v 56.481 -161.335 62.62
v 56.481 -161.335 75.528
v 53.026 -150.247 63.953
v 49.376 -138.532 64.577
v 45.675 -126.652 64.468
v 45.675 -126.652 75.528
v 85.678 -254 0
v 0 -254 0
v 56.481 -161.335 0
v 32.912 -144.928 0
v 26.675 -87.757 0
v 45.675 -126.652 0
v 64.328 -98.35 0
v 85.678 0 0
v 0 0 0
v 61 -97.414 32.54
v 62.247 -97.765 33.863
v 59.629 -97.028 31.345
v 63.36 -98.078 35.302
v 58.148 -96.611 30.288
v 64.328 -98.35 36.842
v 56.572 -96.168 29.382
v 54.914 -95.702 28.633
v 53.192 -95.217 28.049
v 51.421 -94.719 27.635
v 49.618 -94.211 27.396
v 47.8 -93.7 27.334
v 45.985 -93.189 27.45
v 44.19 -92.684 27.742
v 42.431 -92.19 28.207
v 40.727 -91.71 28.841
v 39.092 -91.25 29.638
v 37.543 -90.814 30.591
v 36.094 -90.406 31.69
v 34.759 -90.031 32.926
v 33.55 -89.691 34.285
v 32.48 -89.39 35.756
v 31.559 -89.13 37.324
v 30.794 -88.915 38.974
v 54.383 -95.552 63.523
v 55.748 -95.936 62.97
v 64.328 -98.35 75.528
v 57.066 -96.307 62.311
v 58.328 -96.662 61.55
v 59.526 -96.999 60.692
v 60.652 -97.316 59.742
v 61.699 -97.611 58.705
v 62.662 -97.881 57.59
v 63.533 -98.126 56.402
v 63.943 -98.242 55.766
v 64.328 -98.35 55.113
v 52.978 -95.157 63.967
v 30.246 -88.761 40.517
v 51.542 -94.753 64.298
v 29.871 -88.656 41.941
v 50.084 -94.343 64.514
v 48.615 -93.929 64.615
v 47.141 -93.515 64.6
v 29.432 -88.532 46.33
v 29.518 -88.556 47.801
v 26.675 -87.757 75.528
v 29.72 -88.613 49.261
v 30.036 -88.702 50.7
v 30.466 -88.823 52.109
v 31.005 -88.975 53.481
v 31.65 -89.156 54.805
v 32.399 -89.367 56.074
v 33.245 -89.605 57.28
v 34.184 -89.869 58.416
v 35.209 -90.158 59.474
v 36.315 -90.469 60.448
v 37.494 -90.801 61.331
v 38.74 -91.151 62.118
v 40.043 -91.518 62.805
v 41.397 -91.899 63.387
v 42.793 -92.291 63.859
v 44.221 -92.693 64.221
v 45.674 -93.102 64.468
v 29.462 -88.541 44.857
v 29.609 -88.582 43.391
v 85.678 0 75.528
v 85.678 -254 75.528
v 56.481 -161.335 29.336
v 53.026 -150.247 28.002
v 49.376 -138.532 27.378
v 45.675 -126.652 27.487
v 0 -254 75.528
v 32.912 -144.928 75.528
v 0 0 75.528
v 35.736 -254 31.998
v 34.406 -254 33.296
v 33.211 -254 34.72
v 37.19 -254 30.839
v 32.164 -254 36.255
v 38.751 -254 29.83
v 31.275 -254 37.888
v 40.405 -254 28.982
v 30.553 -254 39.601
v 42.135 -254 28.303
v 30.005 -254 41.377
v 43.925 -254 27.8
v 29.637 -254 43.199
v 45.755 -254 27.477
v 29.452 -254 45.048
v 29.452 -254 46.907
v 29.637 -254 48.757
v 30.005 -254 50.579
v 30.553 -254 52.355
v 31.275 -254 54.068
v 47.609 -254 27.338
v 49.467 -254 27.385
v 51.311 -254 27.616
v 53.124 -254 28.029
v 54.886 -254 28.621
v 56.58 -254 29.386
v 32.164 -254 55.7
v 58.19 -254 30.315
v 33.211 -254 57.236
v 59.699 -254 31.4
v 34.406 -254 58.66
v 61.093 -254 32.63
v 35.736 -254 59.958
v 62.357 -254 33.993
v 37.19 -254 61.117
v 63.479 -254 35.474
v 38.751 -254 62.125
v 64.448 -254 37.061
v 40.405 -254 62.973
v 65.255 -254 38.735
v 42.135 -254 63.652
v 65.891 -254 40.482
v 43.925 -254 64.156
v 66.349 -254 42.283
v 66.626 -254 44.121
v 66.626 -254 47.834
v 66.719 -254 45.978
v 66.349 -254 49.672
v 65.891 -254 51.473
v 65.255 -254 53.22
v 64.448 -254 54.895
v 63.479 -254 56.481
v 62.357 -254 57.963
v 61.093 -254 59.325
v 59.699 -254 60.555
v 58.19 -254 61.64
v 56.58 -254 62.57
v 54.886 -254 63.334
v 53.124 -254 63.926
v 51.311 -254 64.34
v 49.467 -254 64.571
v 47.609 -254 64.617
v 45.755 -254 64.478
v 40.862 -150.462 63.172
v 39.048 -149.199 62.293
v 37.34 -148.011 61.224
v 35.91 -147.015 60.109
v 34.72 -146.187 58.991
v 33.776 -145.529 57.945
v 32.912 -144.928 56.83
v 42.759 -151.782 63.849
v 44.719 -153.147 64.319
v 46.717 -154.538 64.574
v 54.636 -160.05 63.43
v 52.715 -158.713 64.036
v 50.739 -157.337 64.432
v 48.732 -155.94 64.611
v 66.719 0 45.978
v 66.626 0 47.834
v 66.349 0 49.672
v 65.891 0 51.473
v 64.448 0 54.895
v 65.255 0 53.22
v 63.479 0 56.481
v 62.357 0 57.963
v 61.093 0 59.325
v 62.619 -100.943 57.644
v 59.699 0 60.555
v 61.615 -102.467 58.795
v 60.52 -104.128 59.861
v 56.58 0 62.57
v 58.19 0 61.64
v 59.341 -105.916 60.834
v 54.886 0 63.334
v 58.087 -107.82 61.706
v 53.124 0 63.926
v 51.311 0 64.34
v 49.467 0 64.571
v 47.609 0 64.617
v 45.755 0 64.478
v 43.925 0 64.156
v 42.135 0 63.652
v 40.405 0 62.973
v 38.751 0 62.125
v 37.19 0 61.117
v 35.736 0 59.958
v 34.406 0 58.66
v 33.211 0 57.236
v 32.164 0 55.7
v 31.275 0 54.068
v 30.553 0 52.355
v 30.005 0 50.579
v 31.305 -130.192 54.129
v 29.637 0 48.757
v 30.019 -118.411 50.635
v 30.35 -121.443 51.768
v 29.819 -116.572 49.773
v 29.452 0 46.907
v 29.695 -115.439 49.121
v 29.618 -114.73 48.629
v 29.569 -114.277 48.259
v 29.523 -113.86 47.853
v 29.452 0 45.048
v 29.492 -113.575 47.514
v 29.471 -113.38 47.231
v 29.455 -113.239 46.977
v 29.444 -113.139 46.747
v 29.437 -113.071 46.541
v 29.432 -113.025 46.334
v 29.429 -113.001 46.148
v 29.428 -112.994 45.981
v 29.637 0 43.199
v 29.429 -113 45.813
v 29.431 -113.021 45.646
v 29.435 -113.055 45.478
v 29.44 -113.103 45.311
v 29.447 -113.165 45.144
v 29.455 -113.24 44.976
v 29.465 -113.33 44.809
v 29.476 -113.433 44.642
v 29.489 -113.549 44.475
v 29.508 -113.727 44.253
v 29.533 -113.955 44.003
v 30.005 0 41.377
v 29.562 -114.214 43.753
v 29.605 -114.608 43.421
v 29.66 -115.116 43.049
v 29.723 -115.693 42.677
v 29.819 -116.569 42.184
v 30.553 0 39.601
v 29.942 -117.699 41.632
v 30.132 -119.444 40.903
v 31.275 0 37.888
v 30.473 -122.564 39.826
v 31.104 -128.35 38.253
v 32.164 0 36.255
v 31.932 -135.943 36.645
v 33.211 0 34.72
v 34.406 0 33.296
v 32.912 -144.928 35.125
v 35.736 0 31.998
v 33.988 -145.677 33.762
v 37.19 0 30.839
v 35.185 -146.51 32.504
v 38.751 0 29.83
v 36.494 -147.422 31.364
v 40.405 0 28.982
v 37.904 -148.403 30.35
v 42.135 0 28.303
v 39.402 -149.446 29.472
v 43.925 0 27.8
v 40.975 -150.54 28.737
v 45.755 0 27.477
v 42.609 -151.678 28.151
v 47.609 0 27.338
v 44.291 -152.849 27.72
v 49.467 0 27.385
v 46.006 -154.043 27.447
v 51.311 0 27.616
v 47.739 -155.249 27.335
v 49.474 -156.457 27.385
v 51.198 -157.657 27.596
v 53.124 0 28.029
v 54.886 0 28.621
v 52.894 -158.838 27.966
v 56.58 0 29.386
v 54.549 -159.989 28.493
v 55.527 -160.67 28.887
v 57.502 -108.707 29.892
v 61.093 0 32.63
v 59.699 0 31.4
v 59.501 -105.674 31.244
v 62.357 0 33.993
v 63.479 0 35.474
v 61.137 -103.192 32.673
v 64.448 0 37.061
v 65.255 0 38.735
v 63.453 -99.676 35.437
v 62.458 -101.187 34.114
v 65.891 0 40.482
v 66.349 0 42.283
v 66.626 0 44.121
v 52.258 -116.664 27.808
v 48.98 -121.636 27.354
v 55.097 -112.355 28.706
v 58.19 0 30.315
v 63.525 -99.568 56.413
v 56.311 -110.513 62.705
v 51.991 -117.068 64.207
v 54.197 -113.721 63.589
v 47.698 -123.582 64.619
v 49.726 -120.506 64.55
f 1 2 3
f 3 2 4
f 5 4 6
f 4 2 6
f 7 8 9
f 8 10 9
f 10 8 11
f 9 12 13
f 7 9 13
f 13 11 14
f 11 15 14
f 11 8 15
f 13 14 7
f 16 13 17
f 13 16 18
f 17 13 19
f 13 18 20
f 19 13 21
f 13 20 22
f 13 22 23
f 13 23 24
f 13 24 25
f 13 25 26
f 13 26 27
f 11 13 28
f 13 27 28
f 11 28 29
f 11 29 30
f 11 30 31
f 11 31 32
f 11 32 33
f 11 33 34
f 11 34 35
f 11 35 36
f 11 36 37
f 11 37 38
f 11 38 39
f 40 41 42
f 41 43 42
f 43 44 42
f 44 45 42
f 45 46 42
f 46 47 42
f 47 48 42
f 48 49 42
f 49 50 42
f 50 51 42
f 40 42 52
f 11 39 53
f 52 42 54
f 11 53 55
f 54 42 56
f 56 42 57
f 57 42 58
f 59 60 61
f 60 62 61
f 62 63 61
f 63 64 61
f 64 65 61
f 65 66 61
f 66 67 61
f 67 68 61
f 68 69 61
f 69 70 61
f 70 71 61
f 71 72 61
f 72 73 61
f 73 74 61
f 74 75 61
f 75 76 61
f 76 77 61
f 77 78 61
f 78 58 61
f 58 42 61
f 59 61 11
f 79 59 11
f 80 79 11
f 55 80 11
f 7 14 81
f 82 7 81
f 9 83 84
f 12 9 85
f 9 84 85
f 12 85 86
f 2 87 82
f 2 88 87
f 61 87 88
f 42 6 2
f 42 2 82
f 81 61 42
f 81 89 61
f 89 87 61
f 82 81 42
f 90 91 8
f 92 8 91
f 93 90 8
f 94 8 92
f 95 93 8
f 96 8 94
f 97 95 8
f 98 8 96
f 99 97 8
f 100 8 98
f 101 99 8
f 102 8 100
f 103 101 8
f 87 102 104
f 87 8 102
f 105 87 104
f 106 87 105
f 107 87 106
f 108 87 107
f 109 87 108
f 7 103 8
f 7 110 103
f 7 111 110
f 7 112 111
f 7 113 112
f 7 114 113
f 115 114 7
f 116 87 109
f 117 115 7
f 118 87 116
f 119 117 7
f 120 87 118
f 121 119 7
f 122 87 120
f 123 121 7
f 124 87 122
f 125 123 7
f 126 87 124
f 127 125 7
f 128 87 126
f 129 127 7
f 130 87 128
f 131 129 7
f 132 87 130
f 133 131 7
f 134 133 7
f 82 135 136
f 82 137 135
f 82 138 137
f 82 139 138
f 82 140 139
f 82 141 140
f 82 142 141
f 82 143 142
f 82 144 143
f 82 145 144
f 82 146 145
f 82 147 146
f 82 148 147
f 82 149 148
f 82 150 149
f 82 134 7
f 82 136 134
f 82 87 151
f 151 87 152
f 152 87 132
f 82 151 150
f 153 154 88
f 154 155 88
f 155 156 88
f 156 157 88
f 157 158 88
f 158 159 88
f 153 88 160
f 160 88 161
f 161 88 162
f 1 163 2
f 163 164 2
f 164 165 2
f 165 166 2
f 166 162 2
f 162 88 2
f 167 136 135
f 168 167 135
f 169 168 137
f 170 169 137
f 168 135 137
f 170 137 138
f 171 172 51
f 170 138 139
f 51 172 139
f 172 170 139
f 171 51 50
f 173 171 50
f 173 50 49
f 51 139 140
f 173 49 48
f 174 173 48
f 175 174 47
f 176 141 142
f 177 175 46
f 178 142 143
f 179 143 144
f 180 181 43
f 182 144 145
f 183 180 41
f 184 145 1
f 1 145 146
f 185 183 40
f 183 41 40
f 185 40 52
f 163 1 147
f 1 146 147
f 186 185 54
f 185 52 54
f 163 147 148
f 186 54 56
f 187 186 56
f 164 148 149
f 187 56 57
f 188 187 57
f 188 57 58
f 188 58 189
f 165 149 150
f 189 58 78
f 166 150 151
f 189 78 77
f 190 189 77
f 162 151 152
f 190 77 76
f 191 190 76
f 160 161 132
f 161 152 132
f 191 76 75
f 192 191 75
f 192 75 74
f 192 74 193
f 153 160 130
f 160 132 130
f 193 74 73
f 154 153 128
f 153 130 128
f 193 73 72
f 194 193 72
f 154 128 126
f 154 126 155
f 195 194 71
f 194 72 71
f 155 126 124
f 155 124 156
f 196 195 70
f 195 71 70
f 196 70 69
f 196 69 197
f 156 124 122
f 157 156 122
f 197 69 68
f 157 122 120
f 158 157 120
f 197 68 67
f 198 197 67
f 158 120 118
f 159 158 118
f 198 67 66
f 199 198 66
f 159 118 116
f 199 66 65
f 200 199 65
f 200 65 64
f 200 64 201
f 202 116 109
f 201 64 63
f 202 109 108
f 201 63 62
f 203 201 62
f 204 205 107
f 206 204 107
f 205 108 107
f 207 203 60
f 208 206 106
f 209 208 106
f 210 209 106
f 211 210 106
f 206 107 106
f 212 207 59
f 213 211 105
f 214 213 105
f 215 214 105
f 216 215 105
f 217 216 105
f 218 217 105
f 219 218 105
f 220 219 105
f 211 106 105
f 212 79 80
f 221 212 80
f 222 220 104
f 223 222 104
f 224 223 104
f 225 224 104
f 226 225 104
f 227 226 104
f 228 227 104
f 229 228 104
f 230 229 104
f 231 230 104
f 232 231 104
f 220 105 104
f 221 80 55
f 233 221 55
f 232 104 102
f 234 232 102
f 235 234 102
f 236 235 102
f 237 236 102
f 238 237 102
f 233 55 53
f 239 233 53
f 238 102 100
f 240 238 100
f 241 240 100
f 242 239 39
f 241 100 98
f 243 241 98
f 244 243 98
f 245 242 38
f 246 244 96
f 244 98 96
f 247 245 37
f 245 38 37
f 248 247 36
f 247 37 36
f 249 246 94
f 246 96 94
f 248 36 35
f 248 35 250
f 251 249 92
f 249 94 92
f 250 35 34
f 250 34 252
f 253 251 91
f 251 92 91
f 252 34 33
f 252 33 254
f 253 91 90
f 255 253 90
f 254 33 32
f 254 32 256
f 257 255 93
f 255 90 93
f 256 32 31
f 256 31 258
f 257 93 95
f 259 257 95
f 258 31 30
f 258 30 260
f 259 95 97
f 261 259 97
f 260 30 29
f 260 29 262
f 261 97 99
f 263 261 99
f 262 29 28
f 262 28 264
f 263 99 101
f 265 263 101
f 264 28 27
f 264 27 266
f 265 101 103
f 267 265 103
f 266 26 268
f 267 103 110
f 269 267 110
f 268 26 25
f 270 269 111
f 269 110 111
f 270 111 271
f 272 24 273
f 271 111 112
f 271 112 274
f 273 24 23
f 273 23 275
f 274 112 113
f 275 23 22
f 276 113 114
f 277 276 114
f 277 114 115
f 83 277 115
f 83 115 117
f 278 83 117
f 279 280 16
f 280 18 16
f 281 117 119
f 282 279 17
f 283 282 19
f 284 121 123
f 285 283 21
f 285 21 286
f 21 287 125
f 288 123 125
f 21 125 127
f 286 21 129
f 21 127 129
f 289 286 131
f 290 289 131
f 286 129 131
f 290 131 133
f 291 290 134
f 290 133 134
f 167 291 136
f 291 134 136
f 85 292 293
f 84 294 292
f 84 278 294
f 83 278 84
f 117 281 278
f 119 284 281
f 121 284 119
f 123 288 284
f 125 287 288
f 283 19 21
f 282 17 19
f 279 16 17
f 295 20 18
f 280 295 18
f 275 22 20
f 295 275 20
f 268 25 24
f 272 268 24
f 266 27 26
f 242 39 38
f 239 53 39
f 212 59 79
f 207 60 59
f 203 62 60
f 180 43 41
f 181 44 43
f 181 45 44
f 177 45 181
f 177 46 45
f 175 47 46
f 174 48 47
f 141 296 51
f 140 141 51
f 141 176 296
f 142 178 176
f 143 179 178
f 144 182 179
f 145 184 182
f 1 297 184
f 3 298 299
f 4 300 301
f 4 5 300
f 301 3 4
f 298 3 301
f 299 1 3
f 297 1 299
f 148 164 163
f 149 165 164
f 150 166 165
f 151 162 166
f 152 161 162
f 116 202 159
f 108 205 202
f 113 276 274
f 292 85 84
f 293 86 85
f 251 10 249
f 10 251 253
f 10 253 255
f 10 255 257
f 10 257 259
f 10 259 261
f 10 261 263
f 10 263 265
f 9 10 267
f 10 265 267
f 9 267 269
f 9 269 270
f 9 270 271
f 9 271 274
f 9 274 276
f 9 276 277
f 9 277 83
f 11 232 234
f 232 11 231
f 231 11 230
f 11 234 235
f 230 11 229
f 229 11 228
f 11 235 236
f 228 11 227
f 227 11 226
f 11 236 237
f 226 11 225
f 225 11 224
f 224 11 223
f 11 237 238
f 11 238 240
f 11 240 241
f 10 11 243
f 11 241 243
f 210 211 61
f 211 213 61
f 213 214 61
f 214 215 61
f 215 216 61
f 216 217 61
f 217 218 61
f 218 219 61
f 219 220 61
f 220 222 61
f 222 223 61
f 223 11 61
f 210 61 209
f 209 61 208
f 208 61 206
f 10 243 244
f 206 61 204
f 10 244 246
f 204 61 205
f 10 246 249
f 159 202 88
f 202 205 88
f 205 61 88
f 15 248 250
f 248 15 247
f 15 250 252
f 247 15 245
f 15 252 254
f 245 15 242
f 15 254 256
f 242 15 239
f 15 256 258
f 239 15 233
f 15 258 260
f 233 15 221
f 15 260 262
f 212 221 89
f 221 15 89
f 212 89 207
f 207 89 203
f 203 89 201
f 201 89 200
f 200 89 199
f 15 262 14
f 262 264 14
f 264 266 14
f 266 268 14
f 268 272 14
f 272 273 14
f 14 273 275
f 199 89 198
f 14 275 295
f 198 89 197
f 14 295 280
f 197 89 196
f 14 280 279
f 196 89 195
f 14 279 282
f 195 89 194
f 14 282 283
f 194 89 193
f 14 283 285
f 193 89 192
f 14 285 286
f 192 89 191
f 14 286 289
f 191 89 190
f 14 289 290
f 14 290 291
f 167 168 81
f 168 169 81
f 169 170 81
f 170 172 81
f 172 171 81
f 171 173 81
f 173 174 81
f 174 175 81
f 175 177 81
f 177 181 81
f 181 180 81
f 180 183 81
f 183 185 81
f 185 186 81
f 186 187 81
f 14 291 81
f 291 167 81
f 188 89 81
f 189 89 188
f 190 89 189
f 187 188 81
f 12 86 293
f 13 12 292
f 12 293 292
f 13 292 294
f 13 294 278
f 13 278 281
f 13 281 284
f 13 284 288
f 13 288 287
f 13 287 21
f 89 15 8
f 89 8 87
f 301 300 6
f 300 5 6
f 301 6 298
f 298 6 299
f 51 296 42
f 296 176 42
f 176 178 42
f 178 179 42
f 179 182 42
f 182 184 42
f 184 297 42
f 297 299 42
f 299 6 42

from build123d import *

# Parameters (mm, degrees)
F0_W     = 85.677929
F0_H     = 75.528391
F1_DEPTH = 254
F2_R     = 18.645275
F3_DEPTH = 254.001
F5_DEPTH = 127


with BuildPart() as f1:
    # F0 (on Front) → F1 (new body)
    with BuildSketch(Plane.XZ):
        with Locations((42.838964, 37.764195)):
            Rectangle(F0_W, F0_H)
    extrude(amount=F1_DEPTH)

    # F2 (on face) → F3 (cut, through all)
    with BuildSketch(Plane.XZ.offset(254)):
        with Locations((48.073757, 45.977701)):
            Circle(F2_R)
    extrude(amount=-F3_DEPTH, mode=Mode.SUBTRACT)

    # F4 (on face) → F5 (cut)
    with BuildSketch(Plane.XY.offset(75.528391)):
        Polygon((64.327642, -98.35007), (26.675224, -87.756582), (32.912441, -144.928277), (56.481365, -161.33453), (45.67463, -126.652271), align=None)
    extrude(amount=-F5_DEPTH, mode=Mode.SUBTRACT)


solid = f1.part
